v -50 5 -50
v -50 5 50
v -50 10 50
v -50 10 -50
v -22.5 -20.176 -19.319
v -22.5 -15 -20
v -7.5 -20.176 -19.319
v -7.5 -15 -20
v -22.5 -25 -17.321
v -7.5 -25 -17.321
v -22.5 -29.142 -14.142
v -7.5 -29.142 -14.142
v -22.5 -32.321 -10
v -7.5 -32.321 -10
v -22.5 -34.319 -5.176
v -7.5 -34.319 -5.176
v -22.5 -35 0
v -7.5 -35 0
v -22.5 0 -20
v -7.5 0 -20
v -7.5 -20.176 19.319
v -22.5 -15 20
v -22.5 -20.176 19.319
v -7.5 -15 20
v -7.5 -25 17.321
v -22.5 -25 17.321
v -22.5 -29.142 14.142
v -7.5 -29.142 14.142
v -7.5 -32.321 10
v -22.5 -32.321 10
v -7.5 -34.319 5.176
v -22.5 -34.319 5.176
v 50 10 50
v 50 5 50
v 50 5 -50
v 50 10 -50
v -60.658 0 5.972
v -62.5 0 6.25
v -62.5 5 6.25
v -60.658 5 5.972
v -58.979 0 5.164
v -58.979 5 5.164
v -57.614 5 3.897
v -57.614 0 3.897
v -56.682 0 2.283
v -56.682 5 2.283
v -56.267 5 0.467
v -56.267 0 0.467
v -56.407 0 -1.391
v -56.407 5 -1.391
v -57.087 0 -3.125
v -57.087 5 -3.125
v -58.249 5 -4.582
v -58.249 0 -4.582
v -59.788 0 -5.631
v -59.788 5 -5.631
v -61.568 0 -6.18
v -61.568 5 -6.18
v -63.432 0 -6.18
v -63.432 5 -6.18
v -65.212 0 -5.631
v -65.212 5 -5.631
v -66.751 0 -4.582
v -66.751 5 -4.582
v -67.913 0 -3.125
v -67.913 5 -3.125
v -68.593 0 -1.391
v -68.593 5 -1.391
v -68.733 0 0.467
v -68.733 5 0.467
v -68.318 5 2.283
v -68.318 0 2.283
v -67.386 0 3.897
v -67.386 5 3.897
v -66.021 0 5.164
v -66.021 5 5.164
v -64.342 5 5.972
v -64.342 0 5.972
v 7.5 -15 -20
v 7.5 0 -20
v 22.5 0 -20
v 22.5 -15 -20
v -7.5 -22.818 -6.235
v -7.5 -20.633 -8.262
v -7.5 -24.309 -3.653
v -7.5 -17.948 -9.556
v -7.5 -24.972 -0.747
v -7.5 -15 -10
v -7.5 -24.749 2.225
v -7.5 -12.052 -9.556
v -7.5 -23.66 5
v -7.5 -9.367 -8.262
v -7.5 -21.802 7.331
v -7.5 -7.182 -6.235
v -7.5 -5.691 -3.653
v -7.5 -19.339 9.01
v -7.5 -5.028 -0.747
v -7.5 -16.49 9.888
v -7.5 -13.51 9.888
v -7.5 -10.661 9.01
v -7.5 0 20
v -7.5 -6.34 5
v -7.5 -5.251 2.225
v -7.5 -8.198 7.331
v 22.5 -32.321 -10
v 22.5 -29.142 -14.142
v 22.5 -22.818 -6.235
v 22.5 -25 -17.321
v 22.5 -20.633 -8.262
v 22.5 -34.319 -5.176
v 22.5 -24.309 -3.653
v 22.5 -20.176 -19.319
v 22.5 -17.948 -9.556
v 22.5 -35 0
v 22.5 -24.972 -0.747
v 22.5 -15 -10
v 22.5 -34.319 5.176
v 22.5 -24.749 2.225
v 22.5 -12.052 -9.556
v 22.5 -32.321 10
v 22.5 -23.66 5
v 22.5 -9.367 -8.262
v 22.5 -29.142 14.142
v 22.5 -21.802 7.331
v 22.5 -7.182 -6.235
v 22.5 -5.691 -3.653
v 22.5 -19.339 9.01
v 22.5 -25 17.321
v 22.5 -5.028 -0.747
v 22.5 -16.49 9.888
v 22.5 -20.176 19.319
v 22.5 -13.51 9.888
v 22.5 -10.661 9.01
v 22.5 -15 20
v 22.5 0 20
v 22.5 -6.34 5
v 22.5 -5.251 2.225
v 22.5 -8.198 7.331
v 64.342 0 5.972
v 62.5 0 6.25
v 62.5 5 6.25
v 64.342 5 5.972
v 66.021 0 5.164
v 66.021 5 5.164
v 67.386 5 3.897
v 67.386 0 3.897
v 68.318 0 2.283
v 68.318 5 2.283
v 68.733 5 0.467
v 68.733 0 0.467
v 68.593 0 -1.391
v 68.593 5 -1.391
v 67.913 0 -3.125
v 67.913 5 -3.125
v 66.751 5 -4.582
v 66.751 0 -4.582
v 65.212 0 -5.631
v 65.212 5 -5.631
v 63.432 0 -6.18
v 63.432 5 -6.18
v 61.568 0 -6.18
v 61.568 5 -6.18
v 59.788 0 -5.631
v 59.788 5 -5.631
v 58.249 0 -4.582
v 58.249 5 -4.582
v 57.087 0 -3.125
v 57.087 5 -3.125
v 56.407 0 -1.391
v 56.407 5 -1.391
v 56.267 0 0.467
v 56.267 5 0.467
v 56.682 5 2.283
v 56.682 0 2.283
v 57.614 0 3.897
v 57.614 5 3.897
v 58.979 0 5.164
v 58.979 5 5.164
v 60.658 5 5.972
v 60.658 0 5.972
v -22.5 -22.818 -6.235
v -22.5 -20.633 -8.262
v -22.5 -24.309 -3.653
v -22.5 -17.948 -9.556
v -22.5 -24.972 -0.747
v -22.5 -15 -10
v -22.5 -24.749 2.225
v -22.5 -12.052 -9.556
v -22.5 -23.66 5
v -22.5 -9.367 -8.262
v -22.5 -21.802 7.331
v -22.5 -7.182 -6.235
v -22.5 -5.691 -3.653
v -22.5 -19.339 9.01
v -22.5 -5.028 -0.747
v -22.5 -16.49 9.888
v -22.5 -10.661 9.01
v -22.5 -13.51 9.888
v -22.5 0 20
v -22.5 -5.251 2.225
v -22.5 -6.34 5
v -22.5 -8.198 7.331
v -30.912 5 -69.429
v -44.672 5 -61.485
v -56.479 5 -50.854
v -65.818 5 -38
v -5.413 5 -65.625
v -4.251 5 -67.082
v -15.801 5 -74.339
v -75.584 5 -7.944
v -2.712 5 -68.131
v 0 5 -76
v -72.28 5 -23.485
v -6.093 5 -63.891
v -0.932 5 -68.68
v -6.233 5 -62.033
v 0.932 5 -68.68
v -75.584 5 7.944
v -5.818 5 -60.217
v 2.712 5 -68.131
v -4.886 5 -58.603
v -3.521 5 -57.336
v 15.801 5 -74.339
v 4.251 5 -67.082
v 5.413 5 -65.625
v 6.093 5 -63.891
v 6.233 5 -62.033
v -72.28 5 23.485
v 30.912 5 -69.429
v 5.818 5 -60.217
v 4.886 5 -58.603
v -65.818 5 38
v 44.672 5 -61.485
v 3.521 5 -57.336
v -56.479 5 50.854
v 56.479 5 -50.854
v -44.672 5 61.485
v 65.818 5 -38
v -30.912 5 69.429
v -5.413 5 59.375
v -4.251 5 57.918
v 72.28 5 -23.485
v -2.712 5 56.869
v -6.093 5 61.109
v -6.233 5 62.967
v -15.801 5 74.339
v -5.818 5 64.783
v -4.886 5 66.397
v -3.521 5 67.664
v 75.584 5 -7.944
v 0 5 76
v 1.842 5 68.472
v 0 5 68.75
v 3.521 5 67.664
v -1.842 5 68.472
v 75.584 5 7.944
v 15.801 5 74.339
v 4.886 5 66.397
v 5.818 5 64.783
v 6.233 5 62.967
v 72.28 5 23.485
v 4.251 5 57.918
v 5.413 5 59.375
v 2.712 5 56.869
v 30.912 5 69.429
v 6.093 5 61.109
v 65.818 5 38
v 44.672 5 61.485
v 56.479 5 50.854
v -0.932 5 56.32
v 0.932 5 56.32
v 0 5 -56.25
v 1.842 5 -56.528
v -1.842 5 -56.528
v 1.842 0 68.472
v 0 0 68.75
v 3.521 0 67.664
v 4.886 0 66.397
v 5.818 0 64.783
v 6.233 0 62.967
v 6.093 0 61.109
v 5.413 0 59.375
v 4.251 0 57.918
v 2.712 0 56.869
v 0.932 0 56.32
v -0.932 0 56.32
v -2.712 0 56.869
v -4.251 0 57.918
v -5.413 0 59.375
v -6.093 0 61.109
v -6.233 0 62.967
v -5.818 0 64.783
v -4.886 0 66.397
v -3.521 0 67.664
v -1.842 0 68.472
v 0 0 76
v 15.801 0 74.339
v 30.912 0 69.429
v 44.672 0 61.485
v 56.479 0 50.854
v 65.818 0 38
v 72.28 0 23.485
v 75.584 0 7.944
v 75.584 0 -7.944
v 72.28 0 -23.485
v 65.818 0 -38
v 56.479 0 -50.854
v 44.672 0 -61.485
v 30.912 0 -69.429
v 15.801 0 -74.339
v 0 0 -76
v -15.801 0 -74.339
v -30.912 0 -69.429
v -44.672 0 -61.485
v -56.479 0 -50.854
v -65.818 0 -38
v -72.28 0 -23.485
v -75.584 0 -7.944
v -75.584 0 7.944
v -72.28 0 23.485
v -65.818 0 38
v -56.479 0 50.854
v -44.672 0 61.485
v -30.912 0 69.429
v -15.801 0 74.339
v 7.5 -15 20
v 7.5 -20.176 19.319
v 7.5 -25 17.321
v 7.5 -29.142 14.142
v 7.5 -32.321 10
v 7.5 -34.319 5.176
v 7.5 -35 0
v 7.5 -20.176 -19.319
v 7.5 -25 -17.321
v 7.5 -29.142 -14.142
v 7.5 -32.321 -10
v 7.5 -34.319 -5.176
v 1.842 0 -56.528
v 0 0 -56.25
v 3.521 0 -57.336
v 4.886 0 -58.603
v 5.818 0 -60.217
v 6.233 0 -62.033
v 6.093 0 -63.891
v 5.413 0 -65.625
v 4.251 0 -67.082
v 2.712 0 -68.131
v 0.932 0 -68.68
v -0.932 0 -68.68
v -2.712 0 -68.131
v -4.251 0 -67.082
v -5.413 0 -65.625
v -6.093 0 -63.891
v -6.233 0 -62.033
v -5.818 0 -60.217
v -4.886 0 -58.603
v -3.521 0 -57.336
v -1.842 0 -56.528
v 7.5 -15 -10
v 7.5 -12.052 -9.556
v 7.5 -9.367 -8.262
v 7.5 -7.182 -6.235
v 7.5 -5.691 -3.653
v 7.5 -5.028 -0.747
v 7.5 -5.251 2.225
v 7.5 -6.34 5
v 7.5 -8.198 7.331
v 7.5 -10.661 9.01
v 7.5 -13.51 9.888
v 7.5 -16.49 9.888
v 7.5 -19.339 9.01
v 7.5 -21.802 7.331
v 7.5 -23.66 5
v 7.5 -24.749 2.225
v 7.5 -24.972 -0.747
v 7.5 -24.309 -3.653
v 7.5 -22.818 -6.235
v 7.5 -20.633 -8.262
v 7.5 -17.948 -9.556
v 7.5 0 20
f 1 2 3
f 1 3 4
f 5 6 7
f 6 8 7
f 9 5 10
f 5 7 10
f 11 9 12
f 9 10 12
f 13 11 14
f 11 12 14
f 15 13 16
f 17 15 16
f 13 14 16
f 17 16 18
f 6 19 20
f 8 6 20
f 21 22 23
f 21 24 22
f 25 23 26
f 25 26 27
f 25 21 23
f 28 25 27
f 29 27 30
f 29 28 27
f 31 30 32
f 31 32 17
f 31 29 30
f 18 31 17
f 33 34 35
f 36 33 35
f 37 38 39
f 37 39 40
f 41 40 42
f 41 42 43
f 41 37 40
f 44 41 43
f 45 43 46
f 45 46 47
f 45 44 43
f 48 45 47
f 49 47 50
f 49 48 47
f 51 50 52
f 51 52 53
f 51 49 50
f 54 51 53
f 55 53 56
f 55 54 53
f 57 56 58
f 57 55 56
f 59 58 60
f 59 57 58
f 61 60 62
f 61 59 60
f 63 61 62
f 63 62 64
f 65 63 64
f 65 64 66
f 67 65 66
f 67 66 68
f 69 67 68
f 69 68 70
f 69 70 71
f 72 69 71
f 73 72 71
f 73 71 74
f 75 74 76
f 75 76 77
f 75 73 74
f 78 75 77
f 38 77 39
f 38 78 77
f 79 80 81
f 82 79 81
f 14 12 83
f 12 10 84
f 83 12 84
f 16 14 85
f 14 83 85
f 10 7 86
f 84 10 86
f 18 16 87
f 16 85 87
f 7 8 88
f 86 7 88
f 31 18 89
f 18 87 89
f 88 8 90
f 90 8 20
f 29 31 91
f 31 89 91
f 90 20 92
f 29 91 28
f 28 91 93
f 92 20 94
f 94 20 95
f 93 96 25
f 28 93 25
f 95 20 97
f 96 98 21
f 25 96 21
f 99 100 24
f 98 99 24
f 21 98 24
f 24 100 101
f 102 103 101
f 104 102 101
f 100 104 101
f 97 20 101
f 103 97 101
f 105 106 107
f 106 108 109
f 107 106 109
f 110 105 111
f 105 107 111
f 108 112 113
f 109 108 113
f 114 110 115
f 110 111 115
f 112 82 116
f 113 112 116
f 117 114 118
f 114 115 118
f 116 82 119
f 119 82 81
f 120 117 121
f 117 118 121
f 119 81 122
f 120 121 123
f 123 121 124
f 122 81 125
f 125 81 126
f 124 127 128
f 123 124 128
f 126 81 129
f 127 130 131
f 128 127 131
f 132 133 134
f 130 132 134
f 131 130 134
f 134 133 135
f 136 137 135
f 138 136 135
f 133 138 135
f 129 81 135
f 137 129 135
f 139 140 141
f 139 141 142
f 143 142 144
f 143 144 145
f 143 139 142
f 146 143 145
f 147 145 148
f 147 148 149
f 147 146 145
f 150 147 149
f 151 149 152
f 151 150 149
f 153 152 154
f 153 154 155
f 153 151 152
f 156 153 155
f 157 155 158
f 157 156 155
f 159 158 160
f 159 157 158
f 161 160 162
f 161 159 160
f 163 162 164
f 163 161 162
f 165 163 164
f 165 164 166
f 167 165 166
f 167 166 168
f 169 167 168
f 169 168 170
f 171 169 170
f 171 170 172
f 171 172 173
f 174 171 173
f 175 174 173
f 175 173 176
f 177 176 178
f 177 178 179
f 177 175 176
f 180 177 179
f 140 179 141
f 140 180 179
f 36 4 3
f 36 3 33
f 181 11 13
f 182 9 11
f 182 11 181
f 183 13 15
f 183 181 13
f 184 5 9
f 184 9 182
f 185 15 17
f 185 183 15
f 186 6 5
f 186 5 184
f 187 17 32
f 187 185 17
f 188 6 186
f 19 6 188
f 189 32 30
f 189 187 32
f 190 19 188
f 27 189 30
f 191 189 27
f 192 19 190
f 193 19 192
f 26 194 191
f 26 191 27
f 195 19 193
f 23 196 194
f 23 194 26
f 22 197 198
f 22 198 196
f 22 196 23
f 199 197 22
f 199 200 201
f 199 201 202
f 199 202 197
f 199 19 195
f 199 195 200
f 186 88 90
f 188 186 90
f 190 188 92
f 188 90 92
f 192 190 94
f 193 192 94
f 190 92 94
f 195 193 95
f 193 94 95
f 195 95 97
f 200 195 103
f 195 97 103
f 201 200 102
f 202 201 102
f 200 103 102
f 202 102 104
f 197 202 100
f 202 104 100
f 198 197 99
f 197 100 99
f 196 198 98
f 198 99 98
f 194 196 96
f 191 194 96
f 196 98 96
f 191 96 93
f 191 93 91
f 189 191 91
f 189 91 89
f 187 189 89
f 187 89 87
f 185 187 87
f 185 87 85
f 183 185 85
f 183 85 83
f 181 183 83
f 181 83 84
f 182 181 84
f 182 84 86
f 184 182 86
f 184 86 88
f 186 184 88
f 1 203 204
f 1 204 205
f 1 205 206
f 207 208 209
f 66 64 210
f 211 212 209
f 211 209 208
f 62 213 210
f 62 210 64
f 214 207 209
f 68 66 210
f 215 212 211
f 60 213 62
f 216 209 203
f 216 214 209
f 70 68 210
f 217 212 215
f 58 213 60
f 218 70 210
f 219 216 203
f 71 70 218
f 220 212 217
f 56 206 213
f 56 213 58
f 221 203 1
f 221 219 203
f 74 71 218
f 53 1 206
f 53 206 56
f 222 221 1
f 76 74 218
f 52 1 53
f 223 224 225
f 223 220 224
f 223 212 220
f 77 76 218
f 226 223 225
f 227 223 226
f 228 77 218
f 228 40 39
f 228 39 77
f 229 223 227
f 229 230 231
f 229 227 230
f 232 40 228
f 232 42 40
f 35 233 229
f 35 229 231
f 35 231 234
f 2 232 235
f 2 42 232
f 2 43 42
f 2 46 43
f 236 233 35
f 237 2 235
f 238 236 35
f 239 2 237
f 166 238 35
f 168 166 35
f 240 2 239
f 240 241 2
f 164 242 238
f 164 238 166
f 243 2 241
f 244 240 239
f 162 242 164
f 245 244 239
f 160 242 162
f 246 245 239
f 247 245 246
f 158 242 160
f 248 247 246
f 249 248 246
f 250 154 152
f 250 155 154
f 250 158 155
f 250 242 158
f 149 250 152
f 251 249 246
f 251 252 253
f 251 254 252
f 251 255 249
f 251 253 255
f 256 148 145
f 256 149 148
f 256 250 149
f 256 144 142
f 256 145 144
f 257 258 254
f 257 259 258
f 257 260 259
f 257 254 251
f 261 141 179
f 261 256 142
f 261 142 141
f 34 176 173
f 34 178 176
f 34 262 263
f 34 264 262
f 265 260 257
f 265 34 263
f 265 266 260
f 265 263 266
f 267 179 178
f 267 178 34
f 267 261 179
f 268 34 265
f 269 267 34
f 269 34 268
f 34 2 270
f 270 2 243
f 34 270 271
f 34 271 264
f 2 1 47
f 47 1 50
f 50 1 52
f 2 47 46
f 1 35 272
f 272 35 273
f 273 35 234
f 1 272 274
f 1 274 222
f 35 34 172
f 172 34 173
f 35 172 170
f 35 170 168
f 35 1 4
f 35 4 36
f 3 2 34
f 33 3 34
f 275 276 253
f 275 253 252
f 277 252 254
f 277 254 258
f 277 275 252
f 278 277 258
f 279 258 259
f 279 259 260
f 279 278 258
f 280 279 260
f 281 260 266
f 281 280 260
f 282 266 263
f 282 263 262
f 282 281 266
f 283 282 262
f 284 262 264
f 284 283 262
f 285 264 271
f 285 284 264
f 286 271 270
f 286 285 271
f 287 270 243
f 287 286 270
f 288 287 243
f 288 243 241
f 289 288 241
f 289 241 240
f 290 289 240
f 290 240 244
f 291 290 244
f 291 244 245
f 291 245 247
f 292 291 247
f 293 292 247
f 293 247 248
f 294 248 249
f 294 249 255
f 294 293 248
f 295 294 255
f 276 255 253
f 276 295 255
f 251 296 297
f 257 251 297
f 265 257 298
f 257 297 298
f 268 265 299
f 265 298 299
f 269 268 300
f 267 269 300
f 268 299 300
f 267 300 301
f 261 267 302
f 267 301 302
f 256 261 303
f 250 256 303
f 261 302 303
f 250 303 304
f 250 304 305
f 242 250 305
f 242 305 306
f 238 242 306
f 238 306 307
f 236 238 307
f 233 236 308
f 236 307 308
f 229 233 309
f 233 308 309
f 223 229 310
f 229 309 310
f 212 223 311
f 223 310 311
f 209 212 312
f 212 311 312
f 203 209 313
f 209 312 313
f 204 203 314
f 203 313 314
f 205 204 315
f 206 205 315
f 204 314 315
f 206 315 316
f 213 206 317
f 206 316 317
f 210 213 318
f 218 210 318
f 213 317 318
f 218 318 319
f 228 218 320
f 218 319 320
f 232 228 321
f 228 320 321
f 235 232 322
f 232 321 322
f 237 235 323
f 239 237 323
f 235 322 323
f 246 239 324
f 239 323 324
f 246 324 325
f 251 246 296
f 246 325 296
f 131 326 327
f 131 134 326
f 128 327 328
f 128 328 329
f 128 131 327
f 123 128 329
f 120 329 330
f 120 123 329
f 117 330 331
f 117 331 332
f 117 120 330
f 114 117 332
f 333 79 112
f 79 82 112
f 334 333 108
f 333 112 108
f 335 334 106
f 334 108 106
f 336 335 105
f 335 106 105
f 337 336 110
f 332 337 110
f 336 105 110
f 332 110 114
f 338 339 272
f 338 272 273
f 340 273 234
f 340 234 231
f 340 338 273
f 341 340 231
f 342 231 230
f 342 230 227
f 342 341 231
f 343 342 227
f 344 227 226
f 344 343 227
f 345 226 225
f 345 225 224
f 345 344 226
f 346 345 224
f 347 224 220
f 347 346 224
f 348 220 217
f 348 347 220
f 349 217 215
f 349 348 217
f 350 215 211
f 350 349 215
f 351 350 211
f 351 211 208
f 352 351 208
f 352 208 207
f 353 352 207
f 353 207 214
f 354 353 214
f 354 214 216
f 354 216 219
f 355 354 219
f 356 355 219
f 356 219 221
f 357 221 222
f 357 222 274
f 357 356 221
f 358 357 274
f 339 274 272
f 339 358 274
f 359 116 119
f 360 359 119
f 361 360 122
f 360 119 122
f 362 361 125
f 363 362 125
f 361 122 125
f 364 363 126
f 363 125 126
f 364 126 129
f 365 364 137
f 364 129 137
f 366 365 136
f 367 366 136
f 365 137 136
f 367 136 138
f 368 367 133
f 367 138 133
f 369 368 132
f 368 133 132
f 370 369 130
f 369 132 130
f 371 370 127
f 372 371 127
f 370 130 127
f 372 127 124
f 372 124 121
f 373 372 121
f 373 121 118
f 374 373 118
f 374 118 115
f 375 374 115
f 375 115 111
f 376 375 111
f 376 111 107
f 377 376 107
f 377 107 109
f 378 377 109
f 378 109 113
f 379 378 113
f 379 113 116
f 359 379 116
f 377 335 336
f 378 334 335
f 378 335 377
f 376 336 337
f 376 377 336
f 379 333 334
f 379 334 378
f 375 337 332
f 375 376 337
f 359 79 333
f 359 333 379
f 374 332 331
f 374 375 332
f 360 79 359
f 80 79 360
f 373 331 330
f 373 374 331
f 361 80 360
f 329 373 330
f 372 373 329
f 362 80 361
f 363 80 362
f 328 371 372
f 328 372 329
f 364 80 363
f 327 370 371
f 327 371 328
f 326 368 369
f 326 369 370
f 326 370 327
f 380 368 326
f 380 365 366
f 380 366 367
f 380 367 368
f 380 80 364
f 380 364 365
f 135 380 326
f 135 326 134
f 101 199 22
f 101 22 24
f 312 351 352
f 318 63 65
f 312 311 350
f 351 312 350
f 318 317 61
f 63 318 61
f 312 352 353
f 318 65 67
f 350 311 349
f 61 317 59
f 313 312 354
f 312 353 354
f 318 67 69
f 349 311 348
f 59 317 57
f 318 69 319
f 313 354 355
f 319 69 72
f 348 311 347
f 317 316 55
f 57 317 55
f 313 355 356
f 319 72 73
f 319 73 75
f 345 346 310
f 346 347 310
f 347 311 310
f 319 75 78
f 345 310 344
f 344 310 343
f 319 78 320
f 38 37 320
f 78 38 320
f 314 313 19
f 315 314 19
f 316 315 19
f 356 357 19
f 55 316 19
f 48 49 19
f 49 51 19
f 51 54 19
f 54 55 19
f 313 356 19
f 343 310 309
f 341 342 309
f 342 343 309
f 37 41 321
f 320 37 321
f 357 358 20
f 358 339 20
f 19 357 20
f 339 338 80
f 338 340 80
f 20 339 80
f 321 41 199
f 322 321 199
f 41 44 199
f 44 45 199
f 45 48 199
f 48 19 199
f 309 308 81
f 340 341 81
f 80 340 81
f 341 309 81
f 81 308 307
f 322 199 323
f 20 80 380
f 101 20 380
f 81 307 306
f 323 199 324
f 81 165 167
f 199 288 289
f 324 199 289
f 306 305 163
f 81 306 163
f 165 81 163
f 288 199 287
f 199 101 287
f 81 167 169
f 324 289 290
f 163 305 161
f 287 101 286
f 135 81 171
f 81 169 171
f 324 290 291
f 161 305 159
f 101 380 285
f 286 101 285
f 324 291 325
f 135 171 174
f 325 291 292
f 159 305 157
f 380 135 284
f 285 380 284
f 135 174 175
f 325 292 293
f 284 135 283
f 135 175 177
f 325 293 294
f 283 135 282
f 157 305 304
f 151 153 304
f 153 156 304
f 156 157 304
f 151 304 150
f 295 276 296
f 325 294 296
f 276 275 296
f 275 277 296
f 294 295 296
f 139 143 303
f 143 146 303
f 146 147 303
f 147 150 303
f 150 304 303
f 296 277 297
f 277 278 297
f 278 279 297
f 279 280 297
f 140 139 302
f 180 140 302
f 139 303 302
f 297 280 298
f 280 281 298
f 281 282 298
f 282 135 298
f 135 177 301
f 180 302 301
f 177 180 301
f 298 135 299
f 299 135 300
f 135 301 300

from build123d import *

# Parameters (mm, degrees)
SKETCH1_R           = 76
BOSS_EXTRUDE1_DEPTH = 5
SKETCH1_5_R         = 6.25
CUT_EXTRUDE2_DEPTH  = 5
SKETCH2_W           = 100
SKETCH2_H           = 100
BOSS_EXTRUDE2_DEPTH = 5
SKETCH3_W           = 15
SKETCH3_H           = 40
BOSS_EXTRUDE3_DEPTH = 35
FILLET3_R           = 20
SKETCH5_R           = 10
CUT_EXTRUDE3_DEPTH  = 72


with BuildPart() as part:
    # Sketch1 → Boss-Extrude1 (new body)
    with BuildSketch(Plane(origin=(0, 0, 0), x_dir=(1, 0, 0), z_dir=(0, 1, 0))):
        with Locations(Location((0, 0, 0), (0, 0, 270))):
            Circle(SKETCH1_R)
    extrude(amount=BOSS_EXTRUDE1_DEPTH)

    # Sketch1<5> → Cut-Extrude2 (cut)
    with BuildSketch(Plane(origin=(0, 0, 0), x_dir=(1, 0, 0), z_dir=(0, 1, 0))):
        with Locations(Location((-62.5, 0, 0), (0, 0, 270))):
            Circle(SKETCH1_5_R)
        with Locations(Location((0, 62.5, 0), (0, 0, 270))):
            Circle(SKETCH1_5_R)
        with Locations(Location((62.5, 0, 0), (0, 0, 270))):
            Circle(SKETCH1_5_R)
        with Locations(Location((0, -62.5, 0), (0, 0, 270))):
            Circle(SKETCH1_5_R)
    extrude(amount=CUT_EXTRUDE2_DEPTH, mode=Mode.SUBTRACT)

    # Sketch2 → Boss-Extrude2 (add)
    with BuildSketch(Plane(origin=(0, 5, 0), x_dir=(1, 0, 0), z_dir=(0, 1, 0))):
        Rectangle(SKETCH2_W, SKETCH2_H)
    extrude(amount=BOSS_EXTRUDE2_DEPTH)

    # Sketch3 → Boss-Extrude3 (add)
    with BuildSketch(Plane.XZ):
        with Locations((-15, 0)):
            Rectangle(SKETCH3_W, SKETCH3_H)
        with Locations((15, 0)):
            Rectangle(SKETCH3_W, SKETCH3_H)
    extrude(amount=BOSS_EXTRUDE3_DEPTH)

    # Fillet3
    fillet3_edges = [part.edges().sort_by_distance(p)[0] for p in [
        (15, -35, -20),
        (15, -35, 20),
        (-15, -35, 20),
        (-15, -35, -20),
    ]]
    fillet(fillet3_edges, radius=FILLET3_R - 0.0001)  # a hair under: the kernel refuses the full size

    # Sketch5 → Cut-Extrude3 (cut)
    with BuildSketch(Plane(origin=(22.5, 0, 0), x_dir=(0, 0, -1), z_dir=(1, 0, 0))):
        with Locations((0, -15)):
            Circle(SKETCH5_R)
    extrude(amount=-CUT_EXTRUDE3_DEPTH, mode=Mode.SUBTRACT)


solid = part.part
